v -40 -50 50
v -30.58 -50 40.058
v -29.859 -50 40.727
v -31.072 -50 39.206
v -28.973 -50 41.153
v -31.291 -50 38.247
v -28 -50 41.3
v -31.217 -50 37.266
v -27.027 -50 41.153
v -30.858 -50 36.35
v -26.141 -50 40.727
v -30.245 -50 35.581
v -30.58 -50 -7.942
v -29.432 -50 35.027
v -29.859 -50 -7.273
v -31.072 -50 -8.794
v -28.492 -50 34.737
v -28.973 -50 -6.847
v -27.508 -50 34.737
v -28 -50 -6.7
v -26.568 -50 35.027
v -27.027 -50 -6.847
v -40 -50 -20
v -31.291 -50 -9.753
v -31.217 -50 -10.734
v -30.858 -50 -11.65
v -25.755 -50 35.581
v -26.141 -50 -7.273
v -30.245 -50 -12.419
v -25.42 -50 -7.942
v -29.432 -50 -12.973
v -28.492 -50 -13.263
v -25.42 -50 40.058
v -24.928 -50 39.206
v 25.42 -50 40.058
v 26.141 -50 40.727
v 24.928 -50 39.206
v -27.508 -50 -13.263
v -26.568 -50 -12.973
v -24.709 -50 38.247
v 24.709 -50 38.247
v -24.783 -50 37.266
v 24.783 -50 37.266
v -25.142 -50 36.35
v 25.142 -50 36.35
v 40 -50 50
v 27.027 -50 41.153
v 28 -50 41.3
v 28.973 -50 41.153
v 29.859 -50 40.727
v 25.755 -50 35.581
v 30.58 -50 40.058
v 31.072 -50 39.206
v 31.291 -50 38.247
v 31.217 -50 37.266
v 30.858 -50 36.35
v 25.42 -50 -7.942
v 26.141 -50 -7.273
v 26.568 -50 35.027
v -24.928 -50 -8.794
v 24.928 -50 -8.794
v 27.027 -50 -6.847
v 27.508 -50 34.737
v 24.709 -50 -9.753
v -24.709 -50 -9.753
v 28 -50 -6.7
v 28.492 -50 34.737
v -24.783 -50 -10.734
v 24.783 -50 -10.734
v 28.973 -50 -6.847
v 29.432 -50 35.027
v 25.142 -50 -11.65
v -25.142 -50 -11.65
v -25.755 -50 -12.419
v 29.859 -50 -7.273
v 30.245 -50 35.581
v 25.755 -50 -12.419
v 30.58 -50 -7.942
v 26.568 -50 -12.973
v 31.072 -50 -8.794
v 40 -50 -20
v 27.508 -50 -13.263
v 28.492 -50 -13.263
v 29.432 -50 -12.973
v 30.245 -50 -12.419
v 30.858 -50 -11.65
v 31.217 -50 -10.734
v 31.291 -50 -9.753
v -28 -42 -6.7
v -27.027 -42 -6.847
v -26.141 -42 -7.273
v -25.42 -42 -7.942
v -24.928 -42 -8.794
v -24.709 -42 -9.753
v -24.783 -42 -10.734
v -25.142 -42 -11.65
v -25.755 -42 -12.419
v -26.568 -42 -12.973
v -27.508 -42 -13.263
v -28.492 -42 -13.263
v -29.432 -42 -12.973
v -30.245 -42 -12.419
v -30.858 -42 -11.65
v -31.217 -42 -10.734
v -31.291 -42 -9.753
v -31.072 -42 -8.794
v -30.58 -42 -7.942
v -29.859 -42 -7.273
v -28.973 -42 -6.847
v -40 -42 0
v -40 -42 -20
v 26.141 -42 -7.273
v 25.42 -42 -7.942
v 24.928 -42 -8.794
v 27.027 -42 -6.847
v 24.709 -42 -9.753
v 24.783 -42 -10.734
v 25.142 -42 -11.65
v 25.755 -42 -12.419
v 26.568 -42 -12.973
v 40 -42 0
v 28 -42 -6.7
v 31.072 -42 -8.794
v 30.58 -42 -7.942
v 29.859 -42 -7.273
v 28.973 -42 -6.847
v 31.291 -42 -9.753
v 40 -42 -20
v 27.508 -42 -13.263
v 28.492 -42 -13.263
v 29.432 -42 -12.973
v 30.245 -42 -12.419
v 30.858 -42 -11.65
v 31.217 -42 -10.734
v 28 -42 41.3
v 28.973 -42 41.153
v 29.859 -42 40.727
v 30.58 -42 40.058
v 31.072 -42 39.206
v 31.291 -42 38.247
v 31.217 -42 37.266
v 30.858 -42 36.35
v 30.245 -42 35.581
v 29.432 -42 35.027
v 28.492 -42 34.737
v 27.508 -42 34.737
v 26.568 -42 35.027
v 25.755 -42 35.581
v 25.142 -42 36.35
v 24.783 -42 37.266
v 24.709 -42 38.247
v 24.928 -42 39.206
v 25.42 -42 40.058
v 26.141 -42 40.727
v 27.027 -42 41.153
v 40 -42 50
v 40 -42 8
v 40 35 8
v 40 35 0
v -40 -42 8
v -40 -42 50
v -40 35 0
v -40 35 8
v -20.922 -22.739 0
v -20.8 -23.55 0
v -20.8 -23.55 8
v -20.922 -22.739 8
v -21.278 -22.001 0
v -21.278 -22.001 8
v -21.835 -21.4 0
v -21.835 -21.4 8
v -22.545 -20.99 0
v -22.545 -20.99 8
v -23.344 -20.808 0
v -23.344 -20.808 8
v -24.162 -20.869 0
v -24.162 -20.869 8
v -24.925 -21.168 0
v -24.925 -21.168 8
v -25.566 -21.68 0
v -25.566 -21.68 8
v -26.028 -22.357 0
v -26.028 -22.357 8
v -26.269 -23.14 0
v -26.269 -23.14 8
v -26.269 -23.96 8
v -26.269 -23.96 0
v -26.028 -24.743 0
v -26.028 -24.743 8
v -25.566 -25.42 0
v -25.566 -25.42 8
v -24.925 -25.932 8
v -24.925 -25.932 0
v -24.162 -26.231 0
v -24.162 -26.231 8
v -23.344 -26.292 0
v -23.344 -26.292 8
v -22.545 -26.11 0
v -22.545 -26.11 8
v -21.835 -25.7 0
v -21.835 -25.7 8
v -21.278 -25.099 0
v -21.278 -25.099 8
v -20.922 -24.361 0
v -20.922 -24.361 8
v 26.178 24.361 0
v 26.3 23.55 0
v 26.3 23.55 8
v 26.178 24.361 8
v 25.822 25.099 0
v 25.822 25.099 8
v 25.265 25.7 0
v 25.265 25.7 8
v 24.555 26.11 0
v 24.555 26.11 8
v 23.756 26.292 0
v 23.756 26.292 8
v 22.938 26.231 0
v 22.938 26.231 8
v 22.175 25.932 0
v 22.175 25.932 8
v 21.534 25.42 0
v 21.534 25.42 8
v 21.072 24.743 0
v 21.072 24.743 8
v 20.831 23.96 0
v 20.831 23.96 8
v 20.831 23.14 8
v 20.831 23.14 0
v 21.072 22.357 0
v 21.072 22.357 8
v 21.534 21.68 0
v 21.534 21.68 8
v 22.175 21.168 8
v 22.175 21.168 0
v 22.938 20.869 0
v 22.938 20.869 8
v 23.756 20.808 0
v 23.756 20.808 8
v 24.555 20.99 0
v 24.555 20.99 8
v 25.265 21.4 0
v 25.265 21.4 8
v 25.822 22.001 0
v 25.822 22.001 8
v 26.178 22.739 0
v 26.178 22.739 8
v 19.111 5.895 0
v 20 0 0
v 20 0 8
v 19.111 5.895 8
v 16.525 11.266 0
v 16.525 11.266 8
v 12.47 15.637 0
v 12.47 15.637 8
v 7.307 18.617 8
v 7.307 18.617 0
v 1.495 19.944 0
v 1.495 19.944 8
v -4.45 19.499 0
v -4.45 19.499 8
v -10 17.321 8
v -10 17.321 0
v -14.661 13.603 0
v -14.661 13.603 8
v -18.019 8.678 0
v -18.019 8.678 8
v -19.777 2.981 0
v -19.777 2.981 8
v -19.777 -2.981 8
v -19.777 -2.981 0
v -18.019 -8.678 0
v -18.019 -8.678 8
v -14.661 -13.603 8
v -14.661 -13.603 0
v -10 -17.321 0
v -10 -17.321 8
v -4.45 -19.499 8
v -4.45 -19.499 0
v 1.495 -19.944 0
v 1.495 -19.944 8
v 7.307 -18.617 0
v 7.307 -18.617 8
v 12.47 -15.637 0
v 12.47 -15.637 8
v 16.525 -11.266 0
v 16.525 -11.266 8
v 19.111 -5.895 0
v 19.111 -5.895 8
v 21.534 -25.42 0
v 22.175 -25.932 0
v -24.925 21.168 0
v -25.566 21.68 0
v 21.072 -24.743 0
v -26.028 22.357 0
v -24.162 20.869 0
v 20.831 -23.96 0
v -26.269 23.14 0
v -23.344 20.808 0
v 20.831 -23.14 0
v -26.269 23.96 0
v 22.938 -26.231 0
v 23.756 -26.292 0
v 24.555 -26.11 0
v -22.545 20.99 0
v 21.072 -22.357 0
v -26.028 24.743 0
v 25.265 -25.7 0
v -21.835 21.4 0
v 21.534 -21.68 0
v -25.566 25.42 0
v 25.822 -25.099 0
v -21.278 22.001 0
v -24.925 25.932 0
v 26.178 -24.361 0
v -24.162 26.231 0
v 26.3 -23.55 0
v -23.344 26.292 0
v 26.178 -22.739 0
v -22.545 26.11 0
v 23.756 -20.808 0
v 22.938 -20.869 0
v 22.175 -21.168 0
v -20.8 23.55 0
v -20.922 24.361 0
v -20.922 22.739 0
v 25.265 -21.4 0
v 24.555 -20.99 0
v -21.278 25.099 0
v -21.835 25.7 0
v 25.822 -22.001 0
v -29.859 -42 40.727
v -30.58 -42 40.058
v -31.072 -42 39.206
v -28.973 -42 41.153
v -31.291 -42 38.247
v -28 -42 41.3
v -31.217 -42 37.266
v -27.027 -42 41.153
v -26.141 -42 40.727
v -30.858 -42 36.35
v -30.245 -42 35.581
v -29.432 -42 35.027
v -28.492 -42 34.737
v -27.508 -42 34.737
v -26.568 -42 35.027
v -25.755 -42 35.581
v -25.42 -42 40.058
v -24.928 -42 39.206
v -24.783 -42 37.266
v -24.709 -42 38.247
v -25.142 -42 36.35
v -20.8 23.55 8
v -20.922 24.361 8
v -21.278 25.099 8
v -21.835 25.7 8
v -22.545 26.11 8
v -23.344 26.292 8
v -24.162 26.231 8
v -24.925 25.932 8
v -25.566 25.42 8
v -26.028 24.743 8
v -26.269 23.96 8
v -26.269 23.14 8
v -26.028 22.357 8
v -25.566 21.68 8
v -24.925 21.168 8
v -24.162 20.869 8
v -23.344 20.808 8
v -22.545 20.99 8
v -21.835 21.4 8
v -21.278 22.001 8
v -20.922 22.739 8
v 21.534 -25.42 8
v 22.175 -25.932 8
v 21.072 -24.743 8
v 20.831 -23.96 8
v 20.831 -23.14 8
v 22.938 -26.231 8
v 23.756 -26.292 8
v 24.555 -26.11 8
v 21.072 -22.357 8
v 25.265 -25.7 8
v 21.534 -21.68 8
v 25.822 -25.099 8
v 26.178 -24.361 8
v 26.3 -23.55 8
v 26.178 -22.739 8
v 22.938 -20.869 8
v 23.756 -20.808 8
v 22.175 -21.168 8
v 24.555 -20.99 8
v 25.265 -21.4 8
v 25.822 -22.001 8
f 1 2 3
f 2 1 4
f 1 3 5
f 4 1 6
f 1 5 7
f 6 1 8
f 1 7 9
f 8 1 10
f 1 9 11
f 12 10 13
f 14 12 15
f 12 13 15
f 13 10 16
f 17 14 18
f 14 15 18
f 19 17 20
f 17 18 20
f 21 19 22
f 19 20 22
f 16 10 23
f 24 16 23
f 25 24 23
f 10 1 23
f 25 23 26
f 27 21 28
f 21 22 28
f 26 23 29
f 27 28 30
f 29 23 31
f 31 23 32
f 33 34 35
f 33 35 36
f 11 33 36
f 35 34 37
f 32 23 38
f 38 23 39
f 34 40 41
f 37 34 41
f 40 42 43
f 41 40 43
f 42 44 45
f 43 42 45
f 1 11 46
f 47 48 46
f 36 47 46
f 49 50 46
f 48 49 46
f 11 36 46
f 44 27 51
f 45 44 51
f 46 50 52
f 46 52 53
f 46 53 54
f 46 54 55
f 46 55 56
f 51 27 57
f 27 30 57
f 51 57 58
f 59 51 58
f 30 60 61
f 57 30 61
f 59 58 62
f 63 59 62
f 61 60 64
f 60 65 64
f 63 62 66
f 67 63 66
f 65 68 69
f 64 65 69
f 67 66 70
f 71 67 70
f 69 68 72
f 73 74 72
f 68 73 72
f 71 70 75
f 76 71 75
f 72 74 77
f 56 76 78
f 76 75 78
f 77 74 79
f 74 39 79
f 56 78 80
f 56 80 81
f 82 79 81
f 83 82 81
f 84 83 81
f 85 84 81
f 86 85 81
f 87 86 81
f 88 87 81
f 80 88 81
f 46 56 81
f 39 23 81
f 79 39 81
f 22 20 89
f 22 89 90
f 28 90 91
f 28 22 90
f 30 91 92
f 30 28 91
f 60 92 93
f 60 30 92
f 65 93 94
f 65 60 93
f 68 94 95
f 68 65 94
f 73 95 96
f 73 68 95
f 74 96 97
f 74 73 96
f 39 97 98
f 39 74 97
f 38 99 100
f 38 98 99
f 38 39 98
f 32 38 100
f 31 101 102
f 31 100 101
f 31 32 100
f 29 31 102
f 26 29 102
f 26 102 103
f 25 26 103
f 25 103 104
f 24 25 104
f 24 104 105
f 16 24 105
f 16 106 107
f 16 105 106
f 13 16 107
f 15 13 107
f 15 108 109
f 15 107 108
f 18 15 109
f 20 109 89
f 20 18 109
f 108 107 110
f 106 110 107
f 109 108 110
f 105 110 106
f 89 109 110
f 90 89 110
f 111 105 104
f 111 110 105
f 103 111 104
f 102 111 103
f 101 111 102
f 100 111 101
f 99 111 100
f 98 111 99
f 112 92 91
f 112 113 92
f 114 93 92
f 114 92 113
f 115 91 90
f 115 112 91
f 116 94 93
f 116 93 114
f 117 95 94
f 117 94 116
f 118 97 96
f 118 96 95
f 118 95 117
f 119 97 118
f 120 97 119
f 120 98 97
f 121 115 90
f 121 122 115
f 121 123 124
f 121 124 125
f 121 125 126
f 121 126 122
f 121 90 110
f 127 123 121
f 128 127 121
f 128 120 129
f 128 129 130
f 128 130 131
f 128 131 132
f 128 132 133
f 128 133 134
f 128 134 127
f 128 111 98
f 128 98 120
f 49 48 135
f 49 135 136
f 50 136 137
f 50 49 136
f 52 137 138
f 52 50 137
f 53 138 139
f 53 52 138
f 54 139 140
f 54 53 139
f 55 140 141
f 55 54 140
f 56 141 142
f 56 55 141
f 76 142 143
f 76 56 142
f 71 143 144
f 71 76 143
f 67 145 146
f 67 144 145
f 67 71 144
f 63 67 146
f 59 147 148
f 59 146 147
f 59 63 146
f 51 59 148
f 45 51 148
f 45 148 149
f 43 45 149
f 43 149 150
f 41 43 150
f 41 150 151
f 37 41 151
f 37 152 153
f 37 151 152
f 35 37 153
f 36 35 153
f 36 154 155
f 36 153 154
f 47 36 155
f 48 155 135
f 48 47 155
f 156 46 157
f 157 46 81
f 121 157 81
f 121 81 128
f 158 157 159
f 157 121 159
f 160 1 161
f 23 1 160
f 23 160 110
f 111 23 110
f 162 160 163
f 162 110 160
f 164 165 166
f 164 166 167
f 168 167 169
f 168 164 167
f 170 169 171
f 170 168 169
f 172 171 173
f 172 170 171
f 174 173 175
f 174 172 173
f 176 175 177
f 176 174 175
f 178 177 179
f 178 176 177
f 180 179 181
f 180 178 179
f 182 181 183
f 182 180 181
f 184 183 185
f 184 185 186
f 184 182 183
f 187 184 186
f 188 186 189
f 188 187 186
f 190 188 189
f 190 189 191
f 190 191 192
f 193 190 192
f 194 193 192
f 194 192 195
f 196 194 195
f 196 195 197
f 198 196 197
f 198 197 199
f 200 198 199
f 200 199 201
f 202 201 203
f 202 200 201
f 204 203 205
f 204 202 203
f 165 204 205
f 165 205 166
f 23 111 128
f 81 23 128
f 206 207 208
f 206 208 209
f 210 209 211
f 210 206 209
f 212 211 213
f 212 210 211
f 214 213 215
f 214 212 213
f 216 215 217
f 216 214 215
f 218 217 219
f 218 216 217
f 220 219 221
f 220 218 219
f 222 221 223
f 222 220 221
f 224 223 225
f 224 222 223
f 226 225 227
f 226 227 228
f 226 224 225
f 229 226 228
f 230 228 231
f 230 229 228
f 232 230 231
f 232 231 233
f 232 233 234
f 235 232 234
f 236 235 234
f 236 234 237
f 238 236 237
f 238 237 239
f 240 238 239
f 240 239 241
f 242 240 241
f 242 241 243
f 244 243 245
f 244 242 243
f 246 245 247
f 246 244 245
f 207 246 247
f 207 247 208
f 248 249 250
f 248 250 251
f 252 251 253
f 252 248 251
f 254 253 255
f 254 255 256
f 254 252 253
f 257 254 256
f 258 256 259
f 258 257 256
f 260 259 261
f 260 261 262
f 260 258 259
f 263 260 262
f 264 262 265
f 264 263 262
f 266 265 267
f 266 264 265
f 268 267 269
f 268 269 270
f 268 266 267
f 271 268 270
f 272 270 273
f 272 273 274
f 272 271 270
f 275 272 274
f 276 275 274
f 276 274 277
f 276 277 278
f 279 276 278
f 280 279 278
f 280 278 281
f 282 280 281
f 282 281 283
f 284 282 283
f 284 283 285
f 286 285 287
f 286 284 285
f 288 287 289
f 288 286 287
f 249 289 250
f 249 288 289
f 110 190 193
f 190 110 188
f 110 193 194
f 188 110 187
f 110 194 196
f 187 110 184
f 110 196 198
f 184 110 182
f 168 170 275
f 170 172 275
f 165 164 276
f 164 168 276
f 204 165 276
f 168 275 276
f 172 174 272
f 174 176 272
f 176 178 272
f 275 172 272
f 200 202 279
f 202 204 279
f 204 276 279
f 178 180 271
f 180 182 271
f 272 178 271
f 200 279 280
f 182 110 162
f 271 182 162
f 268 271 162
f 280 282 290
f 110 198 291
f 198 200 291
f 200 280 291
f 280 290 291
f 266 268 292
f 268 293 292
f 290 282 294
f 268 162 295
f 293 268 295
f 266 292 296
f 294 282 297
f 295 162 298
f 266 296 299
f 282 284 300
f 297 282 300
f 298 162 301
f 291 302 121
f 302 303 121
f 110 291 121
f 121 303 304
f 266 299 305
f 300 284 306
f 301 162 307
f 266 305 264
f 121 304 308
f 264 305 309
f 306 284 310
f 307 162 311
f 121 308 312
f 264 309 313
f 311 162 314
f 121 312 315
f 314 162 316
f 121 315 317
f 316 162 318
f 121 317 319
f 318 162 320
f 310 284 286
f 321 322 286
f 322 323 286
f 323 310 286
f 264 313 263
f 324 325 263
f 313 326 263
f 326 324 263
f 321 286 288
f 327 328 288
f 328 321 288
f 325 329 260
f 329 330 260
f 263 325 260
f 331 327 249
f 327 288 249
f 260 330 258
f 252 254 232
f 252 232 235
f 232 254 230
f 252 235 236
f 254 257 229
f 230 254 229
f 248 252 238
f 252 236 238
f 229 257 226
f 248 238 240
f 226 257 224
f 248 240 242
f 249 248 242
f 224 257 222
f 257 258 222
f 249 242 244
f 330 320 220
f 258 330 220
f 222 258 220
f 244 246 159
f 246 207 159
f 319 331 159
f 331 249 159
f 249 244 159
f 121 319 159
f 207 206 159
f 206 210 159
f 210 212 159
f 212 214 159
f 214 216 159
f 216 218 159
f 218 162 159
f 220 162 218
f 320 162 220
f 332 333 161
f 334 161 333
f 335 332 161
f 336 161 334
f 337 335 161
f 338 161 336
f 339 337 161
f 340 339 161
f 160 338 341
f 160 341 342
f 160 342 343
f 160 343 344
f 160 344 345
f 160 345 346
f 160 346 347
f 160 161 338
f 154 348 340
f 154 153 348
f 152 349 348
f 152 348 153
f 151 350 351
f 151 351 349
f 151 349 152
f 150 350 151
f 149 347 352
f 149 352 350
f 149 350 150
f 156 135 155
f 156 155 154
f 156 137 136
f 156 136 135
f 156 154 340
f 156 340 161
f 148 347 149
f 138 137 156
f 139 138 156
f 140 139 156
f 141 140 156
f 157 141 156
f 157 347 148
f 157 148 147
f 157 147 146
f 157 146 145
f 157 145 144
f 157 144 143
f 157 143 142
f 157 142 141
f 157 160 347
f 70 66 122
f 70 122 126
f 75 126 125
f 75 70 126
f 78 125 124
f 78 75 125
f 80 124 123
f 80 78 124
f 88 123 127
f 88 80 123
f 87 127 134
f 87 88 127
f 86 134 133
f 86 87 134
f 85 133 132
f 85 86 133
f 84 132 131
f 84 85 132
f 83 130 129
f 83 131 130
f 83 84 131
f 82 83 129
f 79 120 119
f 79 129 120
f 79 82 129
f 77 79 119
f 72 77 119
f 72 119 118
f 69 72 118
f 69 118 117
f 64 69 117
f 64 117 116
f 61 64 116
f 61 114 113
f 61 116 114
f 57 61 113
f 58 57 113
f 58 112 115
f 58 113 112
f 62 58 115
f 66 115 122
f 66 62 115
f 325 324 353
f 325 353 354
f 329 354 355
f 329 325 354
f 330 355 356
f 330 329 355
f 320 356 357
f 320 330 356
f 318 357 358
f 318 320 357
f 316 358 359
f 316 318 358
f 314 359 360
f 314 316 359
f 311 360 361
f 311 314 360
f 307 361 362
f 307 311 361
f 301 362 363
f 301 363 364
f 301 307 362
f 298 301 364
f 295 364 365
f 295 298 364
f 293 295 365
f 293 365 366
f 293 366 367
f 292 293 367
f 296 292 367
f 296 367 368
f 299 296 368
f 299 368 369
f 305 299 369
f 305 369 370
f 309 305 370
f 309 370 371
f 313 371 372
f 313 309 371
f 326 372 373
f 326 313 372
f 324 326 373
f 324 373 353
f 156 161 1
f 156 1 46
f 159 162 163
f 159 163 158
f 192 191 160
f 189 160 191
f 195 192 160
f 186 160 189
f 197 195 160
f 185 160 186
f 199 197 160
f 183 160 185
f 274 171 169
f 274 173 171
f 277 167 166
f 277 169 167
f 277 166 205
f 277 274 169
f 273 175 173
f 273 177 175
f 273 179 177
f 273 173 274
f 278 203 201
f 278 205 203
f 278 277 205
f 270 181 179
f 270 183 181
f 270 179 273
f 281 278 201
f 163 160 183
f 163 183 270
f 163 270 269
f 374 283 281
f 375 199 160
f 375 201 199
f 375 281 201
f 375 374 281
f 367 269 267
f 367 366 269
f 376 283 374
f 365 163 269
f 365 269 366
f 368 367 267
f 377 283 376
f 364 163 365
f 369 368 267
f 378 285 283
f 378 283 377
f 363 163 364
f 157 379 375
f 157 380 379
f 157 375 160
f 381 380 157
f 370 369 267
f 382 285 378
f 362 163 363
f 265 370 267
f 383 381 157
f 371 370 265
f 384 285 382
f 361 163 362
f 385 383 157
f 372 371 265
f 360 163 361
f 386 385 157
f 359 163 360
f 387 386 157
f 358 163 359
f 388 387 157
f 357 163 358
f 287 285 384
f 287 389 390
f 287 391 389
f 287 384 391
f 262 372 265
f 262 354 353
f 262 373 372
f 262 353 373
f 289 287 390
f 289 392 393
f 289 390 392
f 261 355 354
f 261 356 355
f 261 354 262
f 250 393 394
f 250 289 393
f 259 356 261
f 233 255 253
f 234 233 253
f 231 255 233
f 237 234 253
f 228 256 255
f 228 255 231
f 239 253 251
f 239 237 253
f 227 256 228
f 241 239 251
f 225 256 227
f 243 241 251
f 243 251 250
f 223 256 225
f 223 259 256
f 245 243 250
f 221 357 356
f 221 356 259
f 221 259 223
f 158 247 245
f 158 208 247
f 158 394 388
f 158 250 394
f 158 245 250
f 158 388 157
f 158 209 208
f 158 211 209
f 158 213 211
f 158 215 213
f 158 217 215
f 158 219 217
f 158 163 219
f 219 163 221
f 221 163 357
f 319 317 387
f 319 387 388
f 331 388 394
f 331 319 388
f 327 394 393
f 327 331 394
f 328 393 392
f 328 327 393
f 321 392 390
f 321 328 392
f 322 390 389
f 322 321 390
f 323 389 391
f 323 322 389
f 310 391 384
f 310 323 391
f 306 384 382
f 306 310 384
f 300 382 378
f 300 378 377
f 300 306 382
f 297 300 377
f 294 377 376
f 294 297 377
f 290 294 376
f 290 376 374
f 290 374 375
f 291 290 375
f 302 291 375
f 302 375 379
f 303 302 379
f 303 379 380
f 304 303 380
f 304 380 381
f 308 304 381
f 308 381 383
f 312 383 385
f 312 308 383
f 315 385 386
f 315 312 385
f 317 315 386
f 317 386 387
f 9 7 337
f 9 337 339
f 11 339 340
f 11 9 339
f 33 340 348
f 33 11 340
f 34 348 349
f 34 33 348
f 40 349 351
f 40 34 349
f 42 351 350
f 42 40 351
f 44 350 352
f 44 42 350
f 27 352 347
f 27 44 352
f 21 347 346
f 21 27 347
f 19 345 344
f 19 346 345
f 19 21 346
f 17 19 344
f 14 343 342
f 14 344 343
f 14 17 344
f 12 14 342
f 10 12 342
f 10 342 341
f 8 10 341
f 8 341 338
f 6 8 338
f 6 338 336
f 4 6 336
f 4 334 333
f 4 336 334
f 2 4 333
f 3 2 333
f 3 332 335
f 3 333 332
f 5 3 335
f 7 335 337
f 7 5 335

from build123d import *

# Parameters (mm, degrees)
SKETCH1_W                          = 80
SKETCH1_H                          = 85
SKETCH1_R                          = 20
SKETCH1_R_2                        = 2.75
FRONT_PLATE_DEPTH                  = 8
BENCH_FOOT_START                   = -20
SKETCH2_W                          = 80
SKETCH2_H                          = 8
BENCH_FOOT_DEPTH                   = 70
FOUR_M6_FOOT_CLEARANCES_DEPTH      = 82.240384046
FOUR_M6_FOOT_CLEARANCES_DEPTH_BACK = 82.240384046
SKETCH3_R                          = 3.3


with BuildPart() as part:
    # Sketch1 → Front_Plate (new body)
    with BuildSketch(Plane.XY):
        with Locations((0, -7.5)):
            Rectangle(SKETCH1_W, SKETCH1_H)
        Circle(SKETCH1_R, mode=Mode.SUBTRACT)
        with Locations((-23.55, -23.55)):
            Circle(SKETCH1_R_2, mode=Mode.SUBTRACT)
        with Locations((-23.55, 23.55)):
            Circle(SKETCH1_R_2, mode=Mode.SUBTRACT)
        with Locations((23.55, -23.55)):
            Circle(SKETCH1_R_2, mode=Mode.SUBTRACT)
        with Locations((23.55, 23.55)):
            Circle(SKETCH1_R_2, mode=Mode.SUBTRACT)
    extrude(amount=FRONT_PLATE_DEPTH)

    # Sketch2 → Bench_Foot (add)
    with BuildSketch(Plane.XY.offset(BENCH_FOOT_START)):
        with Locations((0, -46)):
            Rectangle(SKETCH2_W, SKETCH2_H)
    extrude(amount=BENCH_FOOT_DEPTH)

    # Sketch3 → Four_M6_Foot_Clearances (cut, two sides: drawn at the far end of the back side and taken through both)
    with BuildSketch(Plane(origin=(0, 0, 0), x_dir=(1, 0, 0), z_dir=(0, 1, 0)).offset(-FOUR_M6_FOOT_CLEARANCES_DEPTH_BACK)):
        with Locations(Location((-28, 10, 0), (0, 0, 270))):
            Circle(SKETCH3_R)
        with Locations(Location((-28, -38, 0), (0, 0, 270))):
            Circle(SKETCH3_R)
        with Locations(Location((28, 10, 0), (0, 0, 270))):
            Circle(SKETCH3_R)
        with Locations(Location((28, -38, 0), (0, 0, 270))):
            Circle(SKETCH3_R)
    extrude(amount=FOUR_M6_FOOT_CLEARANCES_DEPTH + FOUR_M6_FOOT_CLEARANCES_DEPTH_BACK, mode=Mode.SUBTRACT)


solid = part.part
